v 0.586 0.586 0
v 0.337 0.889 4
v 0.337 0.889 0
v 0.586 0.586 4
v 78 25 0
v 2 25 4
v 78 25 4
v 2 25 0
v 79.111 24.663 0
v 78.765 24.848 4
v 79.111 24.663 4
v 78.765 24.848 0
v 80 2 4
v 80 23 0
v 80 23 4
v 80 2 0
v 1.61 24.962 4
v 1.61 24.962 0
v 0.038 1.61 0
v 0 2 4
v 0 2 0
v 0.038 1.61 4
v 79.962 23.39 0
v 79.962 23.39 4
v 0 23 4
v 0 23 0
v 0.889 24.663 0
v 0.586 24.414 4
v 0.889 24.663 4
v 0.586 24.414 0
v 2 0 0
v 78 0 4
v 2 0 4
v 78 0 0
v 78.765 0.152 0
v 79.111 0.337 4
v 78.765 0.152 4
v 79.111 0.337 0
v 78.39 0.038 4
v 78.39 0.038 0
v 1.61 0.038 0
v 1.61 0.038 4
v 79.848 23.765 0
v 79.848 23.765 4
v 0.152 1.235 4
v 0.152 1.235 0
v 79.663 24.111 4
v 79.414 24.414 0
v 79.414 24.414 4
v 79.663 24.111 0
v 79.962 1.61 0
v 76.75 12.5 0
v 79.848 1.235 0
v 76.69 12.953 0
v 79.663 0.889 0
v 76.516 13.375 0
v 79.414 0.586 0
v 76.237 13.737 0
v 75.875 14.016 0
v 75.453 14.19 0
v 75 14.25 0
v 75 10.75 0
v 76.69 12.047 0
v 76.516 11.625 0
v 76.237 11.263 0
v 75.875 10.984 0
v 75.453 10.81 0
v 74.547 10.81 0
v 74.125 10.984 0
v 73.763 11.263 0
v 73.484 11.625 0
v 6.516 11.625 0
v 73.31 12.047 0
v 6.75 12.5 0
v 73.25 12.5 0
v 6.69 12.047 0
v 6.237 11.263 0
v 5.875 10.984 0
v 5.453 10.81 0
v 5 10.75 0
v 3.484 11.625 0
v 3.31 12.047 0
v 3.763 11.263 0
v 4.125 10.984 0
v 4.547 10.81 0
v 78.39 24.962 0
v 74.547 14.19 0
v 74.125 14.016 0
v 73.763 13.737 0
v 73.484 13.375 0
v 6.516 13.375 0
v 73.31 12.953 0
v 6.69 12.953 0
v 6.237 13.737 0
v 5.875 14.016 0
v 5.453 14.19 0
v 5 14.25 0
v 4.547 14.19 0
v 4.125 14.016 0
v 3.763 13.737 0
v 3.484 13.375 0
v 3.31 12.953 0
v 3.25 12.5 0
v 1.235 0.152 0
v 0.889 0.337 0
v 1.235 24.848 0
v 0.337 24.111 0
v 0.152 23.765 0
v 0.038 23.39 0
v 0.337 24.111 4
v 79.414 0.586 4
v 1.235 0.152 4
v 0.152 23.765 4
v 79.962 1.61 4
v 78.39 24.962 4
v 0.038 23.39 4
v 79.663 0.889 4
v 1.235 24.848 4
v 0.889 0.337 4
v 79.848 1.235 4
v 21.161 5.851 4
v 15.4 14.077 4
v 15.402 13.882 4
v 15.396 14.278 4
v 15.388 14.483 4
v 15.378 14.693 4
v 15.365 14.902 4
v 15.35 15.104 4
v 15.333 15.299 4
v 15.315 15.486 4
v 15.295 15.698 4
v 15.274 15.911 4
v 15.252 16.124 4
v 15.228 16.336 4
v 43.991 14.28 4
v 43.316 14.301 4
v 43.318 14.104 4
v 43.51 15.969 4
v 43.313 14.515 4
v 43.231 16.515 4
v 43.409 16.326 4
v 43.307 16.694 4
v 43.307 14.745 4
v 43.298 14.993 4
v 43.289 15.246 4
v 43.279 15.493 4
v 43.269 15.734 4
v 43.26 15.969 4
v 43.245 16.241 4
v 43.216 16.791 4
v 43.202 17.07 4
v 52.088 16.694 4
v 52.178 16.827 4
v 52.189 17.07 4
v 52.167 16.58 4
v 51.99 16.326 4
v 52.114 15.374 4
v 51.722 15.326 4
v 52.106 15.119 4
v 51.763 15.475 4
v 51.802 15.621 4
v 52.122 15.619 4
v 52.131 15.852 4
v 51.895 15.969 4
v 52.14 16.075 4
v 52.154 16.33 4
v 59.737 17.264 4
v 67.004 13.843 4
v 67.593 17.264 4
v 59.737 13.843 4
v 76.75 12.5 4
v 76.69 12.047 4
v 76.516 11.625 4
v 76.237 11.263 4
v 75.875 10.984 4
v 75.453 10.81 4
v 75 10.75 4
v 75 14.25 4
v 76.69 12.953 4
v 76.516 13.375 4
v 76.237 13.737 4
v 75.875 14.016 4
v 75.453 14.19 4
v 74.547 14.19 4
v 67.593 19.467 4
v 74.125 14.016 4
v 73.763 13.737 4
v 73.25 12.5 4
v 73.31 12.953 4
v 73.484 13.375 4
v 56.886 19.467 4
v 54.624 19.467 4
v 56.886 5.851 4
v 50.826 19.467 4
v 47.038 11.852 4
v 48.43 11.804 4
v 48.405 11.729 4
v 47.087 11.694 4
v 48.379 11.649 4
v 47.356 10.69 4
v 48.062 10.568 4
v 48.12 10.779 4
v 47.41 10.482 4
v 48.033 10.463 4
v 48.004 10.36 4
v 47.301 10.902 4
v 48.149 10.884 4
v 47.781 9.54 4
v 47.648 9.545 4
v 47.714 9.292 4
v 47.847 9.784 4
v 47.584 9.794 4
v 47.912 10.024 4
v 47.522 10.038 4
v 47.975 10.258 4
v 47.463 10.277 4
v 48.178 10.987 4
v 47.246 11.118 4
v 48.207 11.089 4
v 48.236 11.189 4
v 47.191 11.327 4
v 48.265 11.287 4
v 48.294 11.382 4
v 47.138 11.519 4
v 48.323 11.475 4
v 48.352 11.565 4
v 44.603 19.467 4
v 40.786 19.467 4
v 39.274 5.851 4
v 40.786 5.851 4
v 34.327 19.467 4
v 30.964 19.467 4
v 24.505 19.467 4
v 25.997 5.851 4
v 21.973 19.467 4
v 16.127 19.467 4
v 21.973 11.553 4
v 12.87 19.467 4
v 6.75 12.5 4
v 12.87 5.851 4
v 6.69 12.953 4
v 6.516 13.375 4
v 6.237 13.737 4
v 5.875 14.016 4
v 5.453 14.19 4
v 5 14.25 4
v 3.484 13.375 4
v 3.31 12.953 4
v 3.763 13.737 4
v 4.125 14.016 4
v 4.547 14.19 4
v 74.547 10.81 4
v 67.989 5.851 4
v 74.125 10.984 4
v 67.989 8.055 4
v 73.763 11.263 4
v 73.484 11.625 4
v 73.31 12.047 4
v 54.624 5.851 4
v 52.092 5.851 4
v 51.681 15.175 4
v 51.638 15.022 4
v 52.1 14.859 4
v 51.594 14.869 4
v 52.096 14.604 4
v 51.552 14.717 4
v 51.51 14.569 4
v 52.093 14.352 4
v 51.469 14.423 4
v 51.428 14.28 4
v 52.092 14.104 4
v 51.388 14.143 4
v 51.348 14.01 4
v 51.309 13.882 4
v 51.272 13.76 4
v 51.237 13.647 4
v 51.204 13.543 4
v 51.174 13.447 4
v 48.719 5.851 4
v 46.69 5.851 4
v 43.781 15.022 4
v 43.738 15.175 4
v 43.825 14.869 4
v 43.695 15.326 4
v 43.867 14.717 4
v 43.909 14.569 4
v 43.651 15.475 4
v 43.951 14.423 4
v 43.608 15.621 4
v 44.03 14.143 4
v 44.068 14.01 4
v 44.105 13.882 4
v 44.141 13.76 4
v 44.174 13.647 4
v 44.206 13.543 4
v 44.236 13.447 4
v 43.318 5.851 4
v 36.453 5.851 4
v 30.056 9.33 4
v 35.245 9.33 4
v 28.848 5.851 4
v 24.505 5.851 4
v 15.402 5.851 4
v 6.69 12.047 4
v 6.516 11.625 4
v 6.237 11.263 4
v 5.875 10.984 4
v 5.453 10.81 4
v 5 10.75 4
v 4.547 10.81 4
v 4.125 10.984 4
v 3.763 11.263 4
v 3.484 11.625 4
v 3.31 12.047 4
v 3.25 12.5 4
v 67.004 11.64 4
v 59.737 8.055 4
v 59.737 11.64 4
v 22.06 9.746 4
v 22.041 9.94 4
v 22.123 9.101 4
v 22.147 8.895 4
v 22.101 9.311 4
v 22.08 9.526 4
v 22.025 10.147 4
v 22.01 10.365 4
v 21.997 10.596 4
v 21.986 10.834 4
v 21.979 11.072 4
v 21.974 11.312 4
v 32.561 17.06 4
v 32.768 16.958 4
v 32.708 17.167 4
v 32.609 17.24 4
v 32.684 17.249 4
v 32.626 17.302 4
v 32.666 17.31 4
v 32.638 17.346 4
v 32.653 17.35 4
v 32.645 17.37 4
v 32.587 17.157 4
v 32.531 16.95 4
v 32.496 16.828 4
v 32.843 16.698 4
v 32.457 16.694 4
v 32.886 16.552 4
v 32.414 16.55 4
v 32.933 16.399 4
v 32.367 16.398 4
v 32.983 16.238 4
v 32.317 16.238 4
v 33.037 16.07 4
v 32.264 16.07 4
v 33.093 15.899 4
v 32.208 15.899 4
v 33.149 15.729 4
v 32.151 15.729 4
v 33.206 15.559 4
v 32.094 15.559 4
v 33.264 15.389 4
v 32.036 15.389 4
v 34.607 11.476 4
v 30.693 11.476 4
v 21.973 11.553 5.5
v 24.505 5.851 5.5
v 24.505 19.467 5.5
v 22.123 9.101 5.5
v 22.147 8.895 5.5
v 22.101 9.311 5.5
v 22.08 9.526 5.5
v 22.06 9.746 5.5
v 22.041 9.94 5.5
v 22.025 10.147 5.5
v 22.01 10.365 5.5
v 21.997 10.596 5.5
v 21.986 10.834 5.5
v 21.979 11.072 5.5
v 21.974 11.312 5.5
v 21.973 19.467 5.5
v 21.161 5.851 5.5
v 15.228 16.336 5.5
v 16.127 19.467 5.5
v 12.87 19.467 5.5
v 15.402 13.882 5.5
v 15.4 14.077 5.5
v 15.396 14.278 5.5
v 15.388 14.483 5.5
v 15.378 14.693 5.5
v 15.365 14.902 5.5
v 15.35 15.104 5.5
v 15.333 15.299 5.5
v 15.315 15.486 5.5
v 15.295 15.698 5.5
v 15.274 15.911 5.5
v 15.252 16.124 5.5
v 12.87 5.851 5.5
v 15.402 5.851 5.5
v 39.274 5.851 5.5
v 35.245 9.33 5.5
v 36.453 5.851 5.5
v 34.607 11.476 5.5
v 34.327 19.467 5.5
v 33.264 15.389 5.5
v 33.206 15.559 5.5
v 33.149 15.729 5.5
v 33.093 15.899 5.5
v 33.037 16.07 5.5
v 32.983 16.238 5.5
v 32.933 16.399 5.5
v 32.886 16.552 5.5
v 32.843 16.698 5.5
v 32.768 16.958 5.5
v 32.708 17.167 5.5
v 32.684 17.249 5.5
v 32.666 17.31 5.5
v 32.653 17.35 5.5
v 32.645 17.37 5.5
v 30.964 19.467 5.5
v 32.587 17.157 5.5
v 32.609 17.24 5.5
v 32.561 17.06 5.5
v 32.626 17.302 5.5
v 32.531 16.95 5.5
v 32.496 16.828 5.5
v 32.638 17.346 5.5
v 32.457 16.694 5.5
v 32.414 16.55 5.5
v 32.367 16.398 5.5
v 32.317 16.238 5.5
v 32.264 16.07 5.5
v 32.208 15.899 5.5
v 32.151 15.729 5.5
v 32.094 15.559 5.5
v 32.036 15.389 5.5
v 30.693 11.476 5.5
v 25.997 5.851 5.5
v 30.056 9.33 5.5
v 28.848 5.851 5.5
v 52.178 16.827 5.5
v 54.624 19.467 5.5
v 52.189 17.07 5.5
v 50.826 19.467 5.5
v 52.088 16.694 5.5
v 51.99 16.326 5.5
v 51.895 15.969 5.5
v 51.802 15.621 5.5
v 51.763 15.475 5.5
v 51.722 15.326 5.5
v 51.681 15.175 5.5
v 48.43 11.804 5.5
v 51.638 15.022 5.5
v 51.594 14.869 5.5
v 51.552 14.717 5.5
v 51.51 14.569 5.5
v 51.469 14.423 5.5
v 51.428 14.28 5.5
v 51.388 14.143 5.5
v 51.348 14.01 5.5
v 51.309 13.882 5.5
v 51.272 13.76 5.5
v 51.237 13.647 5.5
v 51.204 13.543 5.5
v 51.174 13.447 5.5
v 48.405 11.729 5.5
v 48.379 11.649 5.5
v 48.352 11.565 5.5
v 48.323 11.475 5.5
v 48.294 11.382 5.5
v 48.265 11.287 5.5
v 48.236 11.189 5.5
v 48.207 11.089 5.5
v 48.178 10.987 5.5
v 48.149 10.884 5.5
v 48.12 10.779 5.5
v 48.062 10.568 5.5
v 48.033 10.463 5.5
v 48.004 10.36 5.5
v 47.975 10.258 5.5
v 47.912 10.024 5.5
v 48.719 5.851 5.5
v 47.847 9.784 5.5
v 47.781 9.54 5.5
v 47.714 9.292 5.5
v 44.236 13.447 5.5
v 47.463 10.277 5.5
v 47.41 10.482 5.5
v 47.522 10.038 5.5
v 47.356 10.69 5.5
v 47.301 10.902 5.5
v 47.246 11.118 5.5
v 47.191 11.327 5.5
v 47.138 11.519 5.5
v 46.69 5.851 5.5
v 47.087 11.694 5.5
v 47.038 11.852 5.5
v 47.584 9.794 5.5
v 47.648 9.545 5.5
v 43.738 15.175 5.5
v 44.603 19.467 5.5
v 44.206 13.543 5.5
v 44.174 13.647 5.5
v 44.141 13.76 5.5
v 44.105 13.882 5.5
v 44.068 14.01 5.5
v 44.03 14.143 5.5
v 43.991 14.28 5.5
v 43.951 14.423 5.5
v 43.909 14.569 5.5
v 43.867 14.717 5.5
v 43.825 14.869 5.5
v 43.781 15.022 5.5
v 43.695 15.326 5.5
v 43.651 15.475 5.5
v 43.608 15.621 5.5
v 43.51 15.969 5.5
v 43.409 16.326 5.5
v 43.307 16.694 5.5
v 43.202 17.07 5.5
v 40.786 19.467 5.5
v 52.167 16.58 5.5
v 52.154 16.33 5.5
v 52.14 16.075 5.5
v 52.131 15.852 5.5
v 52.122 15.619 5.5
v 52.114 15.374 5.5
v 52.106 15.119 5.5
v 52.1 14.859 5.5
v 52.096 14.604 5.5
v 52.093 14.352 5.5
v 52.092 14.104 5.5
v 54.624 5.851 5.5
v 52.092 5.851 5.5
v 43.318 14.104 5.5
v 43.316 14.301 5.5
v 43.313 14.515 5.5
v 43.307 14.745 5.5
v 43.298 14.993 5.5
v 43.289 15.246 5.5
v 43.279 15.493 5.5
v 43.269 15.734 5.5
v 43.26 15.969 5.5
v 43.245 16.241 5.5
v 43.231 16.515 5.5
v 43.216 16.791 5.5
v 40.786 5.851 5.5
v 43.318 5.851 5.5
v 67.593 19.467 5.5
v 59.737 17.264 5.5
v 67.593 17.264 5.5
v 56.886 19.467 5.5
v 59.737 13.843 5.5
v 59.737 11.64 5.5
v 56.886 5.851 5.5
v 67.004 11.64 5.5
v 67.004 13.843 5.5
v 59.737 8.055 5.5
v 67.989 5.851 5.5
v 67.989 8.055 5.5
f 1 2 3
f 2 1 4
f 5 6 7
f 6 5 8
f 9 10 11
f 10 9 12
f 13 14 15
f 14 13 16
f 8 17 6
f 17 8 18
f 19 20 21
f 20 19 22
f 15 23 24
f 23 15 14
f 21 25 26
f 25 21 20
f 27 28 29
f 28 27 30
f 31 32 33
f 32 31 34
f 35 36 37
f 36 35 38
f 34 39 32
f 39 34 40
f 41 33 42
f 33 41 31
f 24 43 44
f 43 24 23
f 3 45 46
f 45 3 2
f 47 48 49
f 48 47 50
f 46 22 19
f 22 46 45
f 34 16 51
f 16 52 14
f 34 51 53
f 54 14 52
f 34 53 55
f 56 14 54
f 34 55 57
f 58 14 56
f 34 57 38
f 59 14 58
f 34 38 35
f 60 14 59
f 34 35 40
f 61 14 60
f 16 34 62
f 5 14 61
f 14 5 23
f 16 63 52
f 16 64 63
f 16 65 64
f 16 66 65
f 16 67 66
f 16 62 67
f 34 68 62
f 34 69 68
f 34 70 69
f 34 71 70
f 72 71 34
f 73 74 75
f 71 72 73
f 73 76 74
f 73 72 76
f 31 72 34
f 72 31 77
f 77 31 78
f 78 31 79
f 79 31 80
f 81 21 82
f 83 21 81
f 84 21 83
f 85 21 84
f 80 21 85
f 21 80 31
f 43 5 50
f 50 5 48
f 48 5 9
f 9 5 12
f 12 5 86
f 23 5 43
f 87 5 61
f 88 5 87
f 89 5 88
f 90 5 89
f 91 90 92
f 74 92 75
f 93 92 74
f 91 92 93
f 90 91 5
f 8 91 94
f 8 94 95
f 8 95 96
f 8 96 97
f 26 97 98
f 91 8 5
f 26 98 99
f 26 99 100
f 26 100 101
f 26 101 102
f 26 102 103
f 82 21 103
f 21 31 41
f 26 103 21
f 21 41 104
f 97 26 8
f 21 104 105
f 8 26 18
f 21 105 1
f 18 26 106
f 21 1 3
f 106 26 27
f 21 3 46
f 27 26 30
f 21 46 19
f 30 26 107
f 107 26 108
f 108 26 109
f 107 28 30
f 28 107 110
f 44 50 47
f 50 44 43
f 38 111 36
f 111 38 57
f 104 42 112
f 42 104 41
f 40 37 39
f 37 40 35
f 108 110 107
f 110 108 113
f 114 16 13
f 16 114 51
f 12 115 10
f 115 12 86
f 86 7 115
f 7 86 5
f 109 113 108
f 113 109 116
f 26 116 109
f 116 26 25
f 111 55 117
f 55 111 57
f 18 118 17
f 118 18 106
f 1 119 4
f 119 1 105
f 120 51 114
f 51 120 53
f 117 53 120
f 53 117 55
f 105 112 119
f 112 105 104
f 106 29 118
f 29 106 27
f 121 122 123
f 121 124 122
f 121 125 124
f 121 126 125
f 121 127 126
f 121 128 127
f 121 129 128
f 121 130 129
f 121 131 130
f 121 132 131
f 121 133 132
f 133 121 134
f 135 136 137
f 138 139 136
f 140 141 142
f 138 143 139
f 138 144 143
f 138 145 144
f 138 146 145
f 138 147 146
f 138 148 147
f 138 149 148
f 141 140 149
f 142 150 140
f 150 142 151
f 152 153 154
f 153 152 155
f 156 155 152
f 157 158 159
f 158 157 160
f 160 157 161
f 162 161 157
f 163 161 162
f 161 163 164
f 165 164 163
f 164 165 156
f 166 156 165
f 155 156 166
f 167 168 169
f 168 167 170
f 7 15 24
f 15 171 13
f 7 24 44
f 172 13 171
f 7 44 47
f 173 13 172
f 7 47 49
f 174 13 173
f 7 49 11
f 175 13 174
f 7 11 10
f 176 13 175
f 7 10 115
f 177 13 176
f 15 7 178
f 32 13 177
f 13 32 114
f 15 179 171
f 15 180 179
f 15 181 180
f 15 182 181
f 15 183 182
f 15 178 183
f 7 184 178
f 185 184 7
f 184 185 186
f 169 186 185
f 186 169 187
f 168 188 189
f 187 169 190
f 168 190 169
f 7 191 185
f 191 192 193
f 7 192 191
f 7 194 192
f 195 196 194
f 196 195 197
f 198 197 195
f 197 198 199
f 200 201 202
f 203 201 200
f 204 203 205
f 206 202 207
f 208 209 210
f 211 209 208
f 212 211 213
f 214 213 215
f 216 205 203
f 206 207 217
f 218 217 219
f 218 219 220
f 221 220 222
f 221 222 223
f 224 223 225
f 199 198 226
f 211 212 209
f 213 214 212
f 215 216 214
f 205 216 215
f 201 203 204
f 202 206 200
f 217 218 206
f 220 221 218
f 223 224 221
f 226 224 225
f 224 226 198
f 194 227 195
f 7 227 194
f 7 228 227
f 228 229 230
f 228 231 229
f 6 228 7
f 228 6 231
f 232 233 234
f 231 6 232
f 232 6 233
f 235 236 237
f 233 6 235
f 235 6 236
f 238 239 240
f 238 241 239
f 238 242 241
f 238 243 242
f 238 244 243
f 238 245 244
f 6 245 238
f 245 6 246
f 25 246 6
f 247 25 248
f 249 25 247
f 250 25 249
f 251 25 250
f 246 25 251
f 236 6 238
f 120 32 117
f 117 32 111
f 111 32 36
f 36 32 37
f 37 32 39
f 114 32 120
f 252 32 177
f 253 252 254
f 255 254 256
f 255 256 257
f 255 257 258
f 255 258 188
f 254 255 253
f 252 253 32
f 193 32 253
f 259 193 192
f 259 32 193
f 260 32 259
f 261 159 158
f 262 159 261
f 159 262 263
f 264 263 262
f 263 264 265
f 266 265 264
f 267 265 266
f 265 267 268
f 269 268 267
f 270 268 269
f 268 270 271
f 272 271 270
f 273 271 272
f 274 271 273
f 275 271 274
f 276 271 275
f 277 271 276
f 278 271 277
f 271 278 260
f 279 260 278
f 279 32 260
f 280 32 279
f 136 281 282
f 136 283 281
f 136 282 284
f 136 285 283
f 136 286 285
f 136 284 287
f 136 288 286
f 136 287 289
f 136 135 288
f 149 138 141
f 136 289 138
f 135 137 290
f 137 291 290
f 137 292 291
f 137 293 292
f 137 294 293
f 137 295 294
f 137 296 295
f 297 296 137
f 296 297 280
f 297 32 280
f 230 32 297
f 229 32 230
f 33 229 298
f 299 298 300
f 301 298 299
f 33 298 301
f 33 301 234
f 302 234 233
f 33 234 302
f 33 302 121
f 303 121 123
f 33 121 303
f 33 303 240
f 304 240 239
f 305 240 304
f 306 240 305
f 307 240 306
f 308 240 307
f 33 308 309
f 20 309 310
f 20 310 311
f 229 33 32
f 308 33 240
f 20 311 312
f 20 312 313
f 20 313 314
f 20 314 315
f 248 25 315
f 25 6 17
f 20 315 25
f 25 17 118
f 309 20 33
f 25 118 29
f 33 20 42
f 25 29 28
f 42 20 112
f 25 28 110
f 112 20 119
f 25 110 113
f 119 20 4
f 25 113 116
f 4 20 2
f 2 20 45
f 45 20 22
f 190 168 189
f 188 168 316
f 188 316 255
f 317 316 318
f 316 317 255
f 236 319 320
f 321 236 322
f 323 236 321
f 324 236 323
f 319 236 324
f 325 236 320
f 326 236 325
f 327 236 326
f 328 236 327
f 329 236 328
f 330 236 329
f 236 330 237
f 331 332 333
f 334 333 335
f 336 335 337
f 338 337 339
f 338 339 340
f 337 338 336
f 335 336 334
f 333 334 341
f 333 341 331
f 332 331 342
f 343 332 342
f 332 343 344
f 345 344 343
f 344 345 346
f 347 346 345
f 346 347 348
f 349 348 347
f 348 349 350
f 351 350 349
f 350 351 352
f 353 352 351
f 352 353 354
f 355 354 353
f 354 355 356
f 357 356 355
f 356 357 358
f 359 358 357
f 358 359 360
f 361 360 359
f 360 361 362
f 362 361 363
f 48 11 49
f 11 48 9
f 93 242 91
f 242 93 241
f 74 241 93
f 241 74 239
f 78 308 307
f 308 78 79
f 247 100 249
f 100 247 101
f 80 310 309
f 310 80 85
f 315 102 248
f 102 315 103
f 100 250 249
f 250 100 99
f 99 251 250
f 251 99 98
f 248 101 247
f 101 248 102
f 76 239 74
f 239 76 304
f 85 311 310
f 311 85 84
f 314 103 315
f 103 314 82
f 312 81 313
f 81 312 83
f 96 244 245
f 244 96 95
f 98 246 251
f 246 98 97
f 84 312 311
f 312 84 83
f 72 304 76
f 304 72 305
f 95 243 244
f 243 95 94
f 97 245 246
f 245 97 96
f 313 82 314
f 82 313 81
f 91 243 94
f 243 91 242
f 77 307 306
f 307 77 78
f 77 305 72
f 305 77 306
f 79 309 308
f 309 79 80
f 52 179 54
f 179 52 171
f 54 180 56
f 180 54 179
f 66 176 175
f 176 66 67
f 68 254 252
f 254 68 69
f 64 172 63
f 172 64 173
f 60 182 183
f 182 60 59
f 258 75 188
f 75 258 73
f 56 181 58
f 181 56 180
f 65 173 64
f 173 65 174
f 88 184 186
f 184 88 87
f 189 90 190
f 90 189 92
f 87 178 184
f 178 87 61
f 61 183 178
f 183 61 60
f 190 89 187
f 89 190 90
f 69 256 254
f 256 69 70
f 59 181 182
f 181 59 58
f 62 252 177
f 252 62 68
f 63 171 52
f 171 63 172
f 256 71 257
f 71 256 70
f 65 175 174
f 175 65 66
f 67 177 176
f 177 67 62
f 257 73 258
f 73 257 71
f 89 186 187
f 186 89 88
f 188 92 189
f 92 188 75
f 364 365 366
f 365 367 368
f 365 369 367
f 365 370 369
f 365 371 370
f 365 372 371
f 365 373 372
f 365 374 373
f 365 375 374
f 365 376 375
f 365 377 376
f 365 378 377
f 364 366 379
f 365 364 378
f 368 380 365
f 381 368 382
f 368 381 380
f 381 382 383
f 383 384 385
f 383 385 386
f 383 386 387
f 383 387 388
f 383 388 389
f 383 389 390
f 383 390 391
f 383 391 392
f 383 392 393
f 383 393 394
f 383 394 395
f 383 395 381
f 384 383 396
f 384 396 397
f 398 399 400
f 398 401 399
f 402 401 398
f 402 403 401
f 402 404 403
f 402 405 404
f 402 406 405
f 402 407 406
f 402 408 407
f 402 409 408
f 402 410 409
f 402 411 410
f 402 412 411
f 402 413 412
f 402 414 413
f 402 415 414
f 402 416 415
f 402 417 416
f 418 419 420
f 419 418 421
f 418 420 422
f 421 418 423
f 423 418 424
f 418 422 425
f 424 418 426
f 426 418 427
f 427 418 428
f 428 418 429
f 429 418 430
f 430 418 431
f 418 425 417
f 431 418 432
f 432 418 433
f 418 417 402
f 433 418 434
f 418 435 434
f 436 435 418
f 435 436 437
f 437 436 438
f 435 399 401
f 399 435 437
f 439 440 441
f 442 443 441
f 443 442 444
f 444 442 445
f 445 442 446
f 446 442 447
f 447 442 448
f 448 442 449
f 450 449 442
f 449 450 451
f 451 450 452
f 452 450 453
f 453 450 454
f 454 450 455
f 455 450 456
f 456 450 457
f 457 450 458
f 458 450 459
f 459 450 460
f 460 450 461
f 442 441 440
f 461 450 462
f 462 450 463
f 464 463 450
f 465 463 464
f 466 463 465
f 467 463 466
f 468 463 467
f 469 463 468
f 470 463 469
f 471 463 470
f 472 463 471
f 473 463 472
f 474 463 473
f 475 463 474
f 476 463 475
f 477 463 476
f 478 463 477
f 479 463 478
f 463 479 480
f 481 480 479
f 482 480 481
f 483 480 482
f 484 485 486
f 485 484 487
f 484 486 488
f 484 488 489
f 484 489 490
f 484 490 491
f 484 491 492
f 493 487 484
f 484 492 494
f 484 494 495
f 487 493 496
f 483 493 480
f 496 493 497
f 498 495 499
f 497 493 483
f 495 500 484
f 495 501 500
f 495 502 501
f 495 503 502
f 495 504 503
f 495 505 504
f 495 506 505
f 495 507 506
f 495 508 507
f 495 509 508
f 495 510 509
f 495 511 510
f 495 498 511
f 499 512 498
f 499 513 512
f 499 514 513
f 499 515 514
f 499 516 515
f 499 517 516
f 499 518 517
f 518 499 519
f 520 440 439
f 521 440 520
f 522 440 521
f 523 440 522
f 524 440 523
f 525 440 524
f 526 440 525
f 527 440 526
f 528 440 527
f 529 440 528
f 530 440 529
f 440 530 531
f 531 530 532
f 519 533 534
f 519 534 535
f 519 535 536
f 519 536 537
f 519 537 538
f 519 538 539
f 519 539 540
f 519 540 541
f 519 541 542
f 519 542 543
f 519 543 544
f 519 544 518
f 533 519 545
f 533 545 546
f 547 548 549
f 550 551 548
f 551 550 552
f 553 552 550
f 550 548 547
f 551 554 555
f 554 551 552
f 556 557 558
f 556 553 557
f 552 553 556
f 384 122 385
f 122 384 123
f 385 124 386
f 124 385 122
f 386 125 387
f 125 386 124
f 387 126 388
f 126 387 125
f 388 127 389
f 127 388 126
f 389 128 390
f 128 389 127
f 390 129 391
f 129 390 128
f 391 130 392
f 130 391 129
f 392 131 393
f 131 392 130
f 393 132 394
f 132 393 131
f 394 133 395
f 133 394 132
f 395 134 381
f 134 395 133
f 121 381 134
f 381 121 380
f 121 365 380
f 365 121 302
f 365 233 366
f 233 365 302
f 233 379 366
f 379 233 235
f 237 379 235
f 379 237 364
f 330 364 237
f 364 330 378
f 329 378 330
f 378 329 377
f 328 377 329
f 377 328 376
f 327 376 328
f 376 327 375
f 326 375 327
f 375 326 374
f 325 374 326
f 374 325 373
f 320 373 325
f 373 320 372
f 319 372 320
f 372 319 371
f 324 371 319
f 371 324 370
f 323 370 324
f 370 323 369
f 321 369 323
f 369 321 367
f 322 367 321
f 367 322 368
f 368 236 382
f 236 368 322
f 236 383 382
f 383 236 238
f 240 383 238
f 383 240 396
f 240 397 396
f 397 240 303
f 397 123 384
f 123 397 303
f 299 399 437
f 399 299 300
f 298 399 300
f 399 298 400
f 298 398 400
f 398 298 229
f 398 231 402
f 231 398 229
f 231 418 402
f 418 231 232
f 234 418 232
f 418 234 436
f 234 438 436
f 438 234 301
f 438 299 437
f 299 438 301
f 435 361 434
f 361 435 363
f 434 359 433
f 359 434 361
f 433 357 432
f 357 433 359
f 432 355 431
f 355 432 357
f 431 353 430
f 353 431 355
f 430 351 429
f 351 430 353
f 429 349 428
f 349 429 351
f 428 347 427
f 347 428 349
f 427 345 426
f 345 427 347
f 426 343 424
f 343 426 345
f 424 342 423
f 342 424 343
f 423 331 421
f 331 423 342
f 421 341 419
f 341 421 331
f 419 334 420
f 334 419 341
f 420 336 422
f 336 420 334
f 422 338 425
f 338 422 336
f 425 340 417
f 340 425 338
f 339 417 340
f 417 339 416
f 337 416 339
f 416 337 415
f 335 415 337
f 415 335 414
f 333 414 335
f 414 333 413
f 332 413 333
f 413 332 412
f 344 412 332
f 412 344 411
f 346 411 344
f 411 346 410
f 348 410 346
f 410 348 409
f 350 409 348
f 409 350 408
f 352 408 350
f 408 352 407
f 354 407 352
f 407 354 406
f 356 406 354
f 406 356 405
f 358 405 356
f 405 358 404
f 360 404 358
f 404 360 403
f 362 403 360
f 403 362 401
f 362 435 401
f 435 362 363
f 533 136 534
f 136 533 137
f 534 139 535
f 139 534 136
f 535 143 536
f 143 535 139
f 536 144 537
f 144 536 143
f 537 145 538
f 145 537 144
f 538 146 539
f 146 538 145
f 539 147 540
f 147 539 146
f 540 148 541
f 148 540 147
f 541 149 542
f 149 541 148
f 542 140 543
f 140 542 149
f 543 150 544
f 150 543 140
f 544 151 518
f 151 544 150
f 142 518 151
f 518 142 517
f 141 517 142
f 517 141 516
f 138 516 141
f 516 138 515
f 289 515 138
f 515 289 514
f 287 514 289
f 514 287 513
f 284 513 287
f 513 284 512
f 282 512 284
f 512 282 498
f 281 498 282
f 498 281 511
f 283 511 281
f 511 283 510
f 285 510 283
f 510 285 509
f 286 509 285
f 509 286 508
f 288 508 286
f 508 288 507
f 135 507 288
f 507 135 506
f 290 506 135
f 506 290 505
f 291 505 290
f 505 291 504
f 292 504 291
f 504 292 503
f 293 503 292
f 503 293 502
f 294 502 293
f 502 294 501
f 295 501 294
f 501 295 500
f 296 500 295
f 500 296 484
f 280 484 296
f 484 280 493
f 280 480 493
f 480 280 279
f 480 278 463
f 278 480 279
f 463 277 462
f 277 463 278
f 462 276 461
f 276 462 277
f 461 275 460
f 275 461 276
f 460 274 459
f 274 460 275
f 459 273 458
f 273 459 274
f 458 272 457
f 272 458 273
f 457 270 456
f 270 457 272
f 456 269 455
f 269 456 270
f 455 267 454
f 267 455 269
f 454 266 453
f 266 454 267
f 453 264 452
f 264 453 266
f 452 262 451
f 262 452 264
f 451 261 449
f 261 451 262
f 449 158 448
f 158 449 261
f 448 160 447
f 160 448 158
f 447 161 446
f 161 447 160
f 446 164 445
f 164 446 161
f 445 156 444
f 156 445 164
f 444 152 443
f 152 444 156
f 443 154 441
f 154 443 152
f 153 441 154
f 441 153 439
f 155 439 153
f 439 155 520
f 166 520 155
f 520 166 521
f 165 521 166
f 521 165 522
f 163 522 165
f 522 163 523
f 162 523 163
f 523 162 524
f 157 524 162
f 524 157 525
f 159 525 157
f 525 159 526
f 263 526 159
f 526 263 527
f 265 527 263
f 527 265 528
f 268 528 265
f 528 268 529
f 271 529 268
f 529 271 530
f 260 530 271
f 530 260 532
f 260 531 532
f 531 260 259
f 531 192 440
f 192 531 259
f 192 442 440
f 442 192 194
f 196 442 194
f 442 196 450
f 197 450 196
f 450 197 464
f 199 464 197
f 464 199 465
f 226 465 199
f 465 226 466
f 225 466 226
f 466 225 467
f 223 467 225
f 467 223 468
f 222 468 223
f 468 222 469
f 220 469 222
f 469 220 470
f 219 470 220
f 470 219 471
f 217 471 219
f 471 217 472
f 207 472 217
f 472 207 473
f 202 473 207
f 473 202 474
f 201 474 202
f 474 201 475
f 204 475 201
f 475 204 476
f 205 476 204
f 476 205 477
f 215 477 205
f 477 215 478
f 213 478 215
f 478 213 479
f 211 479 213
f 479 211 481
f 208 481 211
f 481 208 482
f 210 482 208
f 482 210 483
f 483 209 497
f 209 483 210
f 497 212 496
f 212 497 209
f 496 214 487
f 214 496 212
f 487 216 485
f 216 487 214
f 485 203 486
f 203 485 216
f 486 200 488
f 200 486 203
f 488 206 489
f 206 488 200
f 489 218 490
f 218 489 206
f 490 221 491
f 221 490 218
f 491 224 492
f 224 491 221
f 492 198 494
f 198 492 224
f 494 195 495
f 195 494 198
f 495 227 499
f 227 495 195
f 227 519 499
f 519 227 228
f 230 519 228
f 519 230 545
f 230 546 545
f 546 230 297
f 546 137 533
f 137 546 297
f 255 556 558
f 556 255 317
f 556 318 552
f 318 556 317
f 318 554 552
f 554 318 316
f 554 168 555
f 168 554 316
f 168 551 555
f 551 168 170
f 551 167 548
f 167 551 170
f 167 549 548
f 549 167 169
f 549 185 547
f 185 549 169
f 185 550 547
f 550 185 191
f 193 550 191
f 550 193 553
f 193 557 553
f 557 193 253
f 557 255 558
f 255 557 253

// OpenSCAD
// DAVIS — Parametric Nameplate with mounting holes

nameplate_text = "NAME";
width          = 80;
height         = 25;
depth          = 4;
text_depth     = 1.5;
font_size      = 0;
border         = 3;
corner_r       = 2;
hole_d         = 3.5;   // screw hole diameter
hole_margin    = 5;     // distance from edge to hole center

_font_size = font_size > 0 ? font_size : (height - border * 2) * 0.75;

module rounded_rect(w, h, d, r) {
    hull() {
        translate([ r,  r, 0]) cylinder(r=r, h=d, $fn=32);
        translate([w-r,  r, 0]) cylinder(r=r, h=d, $fn=32);
        translate([ r, h-r, 0]) cylinder(r=r, h=d, $fn=32);
        translate([w-r, h-r, 0]) cylinder(r=r, h=d, $fn=32);
    }
}

difference() {
    rounded_rect(width, height, depth, corner_r);
    // Mounting holes
    translate([hole_margin, height/2, -0.1])
        cylinder(d=hole_d, h=depth+0.2, $fn=24);
    translate([width-hole_margin, height/2, -0.1])
        cylinder(d=hole_d, h=depth+0.2, $fn=24);
}

// Embossed text
translate([width/2, height/2, depth])
    linear_extrude(height=text_depth)
        text(nameplate_text,
             size=_font_size,
             font="Liberation Sans:style=Bold",
             halign="center",
             valign="center");
